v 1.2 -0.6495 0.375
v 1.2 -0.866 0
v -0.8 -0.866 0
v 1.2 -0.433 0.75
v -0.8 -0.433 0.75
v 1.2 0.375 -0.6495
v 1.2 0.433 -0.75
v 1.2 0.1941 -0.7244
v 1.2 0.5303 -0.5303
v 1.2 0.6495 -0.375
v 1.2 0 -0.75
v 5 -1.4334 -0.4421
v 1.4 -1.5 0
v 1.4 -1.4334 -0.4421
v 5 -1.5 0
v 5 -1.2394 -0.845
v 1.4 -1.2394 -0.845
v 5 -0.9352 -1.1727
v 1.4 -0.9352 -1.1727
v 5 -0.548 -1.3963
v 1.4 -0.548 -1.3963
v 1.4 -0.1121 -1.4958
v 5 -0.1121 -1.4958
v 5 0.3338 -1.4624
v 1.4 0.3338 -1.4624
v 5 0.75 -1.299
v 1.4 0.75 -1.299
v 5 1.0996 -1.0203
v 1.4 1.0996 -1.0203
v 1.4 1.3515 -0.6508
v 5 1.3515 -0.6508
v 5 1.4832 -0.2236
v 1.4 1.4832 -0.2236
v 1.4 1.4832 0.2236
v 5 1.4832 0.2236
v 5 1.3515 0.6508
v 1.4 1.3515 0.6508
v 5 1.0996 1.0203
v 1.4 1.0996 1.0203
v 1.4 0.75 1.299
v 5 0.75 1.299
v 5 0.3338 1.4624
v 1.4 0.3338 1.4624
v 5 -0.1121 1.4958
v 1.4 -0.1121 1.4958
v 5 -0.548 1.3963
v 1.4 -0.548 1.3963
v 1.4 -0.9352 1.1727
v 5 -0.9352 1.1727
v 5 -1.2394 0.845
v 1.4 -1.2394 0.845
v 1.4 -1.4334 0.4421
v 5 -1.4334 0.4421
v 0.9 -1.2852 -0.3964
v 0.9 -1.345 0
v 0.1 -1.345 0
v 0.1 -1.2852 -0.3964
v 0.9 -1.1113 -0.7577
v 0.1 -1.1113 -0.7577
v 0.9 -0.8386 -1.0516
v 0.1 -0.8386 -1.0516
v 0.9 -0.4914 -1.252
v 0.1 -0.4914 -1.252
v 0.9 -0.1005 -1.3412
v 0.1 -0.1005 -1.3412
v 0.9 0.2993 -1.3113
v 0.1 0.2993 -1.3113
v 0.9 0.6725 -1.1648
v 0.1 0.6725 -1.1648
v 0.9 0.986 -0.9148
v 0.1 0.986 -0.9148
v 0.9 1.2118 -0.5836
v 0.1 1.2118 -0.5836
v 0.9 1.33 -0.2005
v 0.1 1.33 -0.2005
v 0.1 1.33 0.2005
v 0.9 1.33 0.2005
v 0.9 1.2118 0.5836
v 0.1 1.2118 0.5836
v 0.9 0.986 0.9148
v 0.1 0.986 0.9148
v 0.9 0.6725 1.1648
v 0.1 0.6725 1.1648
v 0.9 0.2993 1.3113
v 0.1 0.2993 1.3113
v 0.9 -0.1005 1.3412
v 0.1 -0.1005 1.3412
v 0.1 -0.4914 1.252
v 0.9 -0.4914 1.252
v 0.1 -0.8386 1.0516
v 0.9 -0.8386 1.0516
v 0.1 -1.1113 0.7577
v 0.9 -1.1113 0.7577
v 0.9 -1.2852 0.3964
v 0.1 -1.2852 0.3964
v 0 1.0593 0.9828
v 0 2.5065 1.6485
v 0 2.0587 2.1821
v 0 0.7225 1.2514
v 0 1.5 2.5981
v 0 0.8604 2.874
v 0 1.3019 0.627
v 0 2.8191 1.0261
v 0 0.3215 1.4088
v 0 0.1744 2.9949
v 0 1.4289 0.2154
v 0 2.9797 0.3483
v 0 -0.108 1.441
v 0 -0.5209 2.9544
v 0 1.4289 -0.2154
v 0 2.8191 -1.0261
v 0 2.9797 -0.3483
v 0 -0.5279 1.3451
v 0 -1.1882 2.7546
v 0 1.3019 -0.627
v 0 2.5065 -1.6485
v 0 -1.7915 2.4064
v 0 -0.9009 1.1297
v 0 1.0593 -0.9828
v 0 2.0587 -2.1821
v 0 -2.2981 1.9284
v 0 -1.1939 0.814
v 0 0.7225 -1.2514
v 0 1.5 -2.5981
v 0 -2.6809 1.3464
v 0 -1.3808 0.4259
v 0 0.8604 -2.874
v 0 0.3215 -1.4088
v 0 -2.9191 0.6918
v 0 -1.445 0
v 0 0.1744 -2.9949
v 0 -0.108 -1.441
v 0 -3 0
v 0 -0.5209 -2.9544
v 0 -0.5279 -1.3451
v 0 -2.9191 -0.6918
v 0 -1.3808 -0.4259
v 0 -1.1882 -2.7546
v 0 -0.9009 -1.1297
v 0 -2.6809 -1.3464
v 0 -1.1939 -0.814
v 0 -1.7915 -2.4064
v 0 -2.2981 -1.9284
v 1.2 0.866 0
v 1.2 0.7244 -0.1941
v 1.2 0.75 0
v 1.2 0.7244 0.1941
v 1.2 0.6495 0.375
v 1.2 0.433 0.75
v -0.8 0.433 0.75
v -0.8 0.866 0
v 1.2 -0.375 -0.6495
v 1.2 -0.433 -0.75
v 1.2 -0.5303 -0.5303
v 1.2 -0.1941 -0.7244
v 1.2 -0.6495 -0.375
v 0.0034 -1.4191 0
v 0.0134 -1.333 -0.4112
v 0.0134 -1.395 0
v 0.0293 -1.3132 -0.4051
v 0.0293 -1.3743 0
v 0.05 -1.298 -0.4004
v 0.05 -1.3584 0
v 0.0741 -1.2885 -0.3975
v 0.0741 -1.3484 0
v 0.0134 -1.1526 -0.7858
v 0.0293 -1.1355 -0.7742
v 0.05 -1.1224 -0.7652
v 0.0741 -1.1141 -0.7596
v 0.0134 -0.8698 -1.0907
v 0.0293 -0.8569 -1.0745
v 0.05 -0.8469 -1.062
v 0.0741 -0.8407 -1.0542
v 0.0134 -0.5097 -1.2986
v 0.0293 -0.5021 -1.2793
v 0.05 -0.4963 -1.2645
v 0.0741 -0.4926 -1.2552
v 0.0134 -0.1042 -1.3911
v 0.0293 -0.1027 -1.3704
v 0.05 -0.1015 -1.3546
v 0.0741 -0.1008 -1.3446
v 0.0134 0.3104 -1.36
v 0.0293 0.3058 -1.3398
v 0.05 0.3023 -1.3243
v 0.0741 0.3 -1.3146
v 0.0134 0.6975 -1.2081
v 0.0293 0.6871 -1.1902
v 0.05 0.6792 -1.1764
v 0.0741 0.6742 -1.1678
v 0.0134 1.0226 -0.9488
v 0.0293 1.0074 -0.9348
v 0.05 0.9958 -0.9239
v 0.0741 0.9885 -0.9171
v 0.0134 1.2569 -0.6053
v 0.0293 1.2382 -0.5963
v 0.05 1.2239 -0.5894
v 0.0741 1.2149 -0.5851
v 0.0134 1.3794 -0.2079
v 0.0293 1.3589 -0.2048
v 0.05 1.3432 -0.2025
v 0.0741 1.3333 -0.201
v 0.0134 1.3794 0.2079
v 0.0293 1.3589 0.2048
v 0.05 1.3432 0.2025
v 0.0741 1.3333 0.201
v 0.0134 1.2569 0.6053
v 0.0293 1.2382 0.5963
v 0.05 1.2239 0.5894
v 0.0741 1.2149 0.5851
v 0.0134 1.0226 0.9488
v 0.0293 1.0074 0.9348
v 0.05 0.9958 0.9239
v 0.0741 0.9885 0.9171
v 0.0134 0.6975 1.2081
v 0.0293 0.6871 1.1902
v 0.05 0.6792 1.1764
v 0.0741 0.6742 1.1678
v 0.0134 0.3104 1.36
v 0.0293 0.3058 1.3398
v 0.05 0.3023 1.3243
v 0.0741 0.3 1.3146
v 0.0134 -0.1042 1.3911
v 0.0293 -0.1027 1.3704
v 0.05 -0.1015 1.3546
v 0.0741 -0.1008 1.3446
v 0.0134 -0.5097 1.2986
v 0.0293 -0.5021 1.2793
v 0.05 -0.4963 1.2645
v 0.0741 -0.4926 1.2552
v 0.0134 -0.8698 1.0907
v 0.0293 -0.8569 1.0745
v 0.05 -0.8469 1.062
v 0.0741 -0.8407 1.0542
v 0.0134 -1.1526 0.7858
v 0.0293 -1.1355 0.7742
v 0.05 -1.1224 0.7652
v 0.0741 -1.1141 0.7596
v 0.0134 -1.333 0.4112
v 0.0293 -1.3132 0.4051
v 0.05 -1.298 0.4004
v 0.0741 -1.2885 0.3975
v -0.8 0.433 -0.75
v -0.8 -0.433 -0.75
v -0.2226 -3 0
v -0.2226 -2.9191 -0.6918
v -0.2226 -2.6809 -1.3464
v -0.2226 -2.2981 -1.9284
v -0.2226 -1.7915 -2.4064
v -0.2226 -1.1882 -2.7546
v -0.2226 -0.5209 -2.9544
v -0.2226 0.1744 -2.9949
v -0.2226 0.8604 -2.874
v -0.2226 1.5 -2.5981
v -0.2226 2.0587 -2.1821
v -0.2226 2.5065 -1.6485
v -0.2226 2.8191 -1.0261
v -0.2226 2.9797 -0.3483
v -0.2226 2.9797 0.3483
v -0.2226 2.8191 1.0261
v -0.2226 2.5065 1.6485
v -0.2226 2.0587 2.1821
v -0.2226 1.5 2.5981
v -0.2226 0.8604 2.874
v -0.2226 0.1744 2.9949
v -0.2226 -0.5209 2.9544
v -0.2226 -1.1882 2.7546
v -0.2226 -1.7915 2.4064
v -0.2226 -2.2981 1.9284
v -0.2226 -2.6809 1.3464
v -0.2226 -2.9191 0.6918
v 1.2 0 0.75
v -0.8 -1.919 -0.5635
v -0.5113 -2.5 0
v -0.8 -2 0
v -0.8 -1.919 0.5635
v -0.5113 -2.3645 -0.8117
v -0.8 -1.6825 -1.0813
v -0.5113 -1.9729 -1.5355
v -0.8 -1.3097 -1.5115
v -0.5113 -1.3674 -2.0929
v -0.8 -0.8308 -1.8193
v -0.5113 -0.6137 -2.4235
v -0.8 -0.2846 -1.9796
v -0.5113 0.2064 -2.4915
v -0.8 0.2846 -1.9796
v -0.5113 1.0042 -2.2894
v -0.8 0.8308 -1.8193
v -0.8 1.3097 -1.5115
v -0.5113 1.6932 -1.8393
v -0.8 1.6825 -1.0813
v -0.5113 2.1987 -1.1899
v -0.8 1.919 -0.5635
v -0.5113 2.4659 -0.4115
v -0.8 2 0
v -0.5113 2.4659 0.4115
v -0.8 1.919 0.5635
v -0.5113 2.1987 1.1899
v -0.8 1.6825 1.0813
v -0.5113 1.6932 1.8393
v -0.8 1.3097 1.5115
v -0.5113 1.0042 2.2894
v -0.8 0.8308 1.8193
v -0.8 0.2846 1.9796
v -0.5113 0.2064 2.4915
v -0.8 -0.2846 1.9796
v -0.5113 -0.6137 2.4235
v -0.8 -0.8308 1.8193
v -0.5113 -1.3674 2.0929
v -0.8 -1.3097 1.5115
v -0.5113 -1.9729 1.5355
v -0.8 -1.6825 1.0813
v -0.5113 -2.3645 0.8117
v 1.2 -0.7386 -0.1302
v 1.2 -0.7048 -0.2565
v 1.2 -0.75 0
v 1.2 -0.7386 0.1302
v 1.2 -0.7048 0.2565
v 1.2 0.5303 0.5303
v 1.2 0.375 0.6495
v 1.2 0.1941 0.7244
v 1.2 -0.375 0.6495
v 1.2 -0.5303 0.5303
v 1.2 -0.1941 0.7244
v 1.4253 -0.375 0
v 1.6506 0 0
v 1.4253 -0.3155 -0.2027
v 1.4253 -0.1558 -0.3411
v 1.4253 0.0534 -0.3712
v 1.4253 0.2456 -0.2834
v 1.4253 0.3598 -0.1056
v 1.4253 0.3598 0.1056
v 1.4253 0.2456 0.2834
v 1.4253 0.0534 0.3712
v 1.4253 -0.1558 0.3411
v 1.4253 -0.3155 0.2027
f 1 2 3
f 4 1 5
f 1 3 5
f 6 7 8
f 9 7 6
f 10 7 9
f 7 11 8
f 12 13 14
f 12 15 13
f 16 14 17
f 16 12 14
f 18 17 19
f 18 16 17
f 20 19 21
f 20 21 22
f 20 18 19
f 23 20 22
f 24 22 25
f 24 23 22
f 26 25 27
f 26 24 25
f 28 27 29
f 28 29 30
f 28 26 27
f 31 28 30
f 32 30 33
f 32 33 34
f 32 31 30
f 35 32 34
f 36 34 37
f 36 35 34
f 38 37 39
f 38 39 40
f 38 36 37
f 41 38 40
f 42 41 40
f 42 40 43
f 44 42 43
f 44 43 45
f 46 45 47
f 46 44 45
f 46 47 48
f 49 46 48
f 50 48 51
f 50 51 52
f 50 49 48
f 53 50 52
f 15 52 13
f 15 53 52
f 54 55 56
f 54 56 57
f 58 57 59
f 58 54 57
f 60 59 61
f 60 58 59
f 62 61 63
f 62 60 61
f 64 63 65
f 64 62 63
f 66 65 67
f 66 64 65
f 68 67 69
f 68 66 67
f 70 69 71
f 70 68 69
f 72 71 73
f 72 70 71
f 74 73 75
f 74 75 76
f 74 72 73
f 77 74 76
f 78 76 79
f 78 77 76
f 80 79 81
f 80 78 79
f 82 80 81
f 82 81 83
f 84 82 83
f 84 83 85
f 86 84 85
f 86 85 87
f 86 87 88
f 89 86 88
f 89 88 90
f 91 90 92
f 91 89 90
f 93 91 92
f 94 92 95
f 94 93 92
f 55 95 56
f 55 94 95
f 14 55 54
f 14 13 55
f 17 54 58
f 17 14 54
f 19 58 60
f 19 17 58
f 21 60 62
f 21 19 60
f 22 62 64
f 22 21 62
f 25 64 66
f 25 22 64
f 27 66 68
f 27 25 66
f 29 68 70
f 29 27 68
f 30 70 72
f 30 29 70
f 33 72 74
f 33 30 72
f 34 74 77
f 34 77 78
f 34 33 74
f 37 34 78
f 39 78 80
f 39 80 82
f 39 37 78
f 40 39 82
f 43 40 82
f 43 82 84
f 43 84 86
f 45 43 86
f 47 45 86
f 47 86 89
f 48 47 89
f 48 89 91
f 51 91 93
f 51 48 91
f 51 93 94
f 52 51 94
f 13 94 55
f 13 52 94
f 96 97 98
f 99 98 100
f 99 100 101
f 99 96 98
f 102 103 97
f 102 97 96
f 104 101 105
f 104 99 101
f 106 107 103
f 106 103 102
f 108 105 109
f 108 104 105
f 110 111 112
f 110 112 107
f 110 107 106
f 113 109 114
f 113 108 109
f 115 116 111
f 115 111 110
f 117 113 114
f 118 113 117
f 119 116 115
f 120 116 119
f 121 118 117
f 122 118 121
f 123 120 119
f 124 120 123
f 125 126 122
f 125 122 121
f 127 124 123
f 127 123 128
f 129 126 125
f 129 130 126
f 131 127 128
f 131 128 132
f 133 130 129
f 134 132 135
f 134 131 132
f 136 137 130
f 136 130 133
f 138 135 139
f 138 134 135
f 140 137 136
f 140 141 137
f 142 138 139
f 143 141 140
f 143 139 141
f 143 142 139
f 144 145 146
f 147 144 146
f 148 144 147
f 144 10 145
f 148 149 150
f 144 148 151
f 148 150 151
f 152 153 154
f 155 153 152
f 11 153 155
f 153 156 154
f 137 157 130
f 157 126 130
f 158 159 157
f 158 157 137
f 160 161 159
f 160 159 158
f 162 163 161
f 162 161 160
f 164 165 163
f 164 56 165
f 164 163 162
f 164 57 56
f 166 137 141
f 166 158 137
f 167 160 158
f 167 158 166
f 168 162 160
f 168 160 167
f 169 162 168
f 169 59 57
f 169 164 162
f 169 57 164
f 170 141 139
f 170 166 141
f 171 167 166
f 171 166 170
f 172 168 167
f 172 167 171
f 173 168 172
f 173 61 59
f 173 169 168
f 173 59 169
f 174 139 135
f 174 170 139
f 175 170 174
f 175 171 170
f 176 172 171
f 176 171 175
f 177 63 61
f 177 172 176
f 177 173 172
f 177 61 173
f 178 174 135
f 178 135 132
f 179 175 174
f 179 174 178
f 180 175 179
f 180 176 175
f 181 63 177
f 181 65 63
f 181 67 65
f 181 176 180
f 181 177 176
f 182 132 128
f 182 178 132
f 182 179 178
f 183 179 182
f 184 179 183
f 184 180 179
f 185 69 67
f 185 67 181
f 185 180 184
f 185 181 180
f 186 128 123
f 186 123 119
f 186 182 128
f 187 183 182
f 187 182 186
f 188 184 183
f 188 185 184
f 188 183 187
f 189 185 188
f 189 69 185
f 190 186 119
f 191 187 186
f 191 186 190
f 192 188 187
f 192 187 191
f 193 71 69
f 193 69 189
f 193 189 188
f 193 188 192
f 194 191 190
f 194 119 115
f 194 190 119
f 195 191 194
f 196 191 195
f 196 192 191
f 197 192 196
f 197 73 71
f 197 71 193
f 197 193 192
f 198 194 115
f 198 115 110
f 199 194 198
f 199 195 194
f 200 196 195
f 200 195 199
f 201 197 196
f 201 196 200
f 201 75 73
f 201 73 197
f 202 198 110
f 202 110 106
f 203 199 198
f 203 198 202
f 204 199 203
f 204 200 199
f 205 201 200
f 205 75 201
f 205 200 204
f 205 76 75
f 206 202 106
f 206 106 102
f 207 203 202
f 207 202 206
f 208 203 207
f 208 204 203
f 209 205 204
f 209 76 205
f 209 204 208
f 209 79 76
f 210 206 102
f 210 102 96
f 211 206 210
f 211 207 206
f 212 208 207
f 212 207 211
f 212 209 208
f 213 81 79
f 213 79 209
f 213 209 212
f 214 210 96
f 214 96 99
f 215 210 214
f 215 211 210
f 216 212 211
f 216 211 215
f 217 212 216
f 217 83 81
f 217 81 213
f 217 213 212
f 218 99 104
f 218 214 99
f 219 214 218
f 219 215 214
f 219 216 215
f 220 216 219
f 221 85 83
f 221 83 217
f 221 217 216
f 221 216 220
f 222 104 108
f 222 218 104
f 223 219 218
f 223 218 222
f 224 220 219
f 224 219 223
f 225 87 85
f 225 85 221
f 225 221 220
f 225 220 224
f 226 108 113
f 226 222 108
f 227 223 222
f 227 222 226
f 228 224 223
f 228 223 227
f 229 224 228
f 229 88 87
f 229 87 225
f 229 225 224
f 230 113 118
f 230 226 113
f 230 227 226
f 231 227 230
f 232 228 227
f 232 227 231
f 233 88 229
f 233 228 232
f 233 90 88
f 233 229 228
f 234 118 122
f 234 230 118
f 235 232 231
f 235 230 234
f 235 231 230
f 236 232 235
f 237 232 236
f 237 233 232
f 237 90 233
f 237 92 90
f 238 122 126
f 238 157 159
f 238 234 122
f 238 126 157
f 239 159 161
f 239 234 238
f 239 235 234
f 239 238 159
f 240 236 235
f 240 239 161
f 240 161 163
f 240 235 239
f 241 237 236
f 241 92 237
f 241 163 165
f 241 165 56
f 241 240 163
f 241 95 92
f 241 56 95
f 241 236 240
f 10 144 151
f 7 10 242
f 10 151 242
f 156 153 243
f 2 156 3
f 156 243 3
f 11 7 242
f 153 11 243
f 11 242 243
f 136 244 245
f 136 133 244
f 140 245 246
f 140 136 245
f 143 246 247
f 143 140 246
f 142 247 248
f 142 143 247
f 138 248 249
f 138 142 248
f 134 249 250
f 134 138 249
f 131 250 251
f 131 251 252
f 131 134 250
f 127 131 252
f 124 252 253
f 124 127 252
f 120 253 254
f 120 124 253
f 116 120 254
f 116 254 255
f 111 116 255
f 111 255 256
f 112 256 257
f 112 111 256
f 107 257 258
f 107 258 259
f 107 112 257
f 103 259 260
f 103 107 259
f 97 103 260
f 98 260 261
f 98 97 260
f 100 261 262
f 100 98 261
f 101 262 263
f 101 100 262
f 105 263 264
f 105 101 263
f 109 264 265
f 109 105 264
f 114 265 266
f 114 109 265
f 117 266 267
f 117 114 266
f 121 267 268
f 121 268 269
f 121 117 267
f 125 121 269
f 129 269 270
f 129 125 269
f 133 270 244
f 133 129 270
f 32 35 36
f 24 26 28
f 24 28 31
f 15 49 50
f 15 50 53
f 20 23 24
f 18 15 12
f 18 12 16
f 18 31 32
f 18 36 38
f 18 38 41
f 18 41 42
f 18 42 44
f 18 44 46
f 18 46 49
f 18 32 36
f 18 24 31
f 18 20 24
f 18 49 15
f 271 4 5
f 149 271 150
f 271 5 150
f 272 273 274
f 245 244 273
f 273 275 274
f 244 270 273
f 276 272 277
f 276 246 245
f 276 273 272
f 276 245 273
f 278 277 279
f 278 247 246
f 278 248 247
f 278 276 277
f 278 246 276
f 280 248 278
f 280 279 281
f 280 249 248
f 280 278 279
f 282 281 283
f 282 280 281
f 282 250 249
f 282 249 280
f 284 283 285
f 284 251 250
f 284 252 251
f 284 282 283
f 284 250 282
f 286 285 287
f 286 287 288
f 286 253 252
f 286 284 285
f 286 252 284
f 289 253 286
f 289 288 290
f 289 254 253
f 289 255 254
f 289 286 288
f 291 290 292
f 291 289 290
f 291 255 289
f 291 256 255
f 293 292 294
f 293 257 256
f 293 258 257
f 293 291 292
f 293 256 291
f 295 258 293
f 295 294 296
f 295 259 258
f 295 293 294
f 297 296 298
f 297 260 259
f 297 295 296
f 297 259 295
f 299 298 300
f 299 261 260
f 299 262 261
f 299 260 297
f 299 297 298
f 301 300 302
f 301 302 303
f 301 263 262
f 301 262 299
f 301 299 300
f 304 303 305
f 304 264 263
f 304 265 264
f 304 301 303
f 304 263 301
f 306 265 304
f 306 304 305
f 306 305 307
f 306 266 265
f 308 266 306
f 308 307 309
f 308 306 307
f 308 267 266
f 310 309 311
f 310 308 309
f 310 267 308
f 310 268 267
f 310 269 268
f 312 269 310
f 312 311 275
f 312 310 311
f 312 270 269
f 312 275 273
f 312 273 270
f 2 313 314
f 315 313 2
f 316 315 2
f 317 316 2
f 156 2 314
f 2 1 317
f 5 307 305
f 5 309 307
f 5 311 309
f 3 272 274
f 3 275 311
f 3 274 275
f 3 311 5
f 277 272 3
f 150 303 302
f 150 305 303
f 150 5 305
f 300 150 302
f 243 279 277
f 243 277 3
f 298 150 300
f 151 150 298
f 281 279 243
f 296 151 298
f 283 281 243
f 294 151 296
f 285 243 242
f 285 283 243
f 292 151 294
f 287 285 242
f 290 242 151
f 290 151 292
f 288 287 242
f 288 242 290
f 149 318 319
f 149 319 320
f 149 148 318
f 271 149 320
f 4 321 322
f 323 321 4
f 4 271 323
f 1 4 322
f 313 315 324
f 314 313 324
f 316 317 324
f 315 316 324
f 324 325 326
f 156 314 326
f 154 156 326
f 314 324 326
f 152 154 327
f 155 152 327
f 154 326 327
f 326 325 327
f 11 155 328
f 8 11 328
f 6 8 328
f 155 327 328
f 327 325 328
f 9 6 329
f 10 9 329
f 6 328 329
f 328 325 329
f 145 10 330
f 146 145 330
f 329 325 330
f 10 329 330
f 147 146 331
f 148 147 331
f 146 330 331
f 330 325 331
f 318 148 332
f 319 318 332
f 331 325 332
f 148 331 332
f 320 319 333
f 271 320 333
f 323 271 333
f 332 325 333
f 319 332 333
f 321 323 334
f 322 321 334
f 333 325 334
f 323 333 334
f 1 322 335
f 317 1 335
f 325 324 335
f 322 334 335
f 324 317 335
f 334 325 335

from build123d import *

# Parameters (mm, degrees)
FILLET1_R          = 0.1
CUT_EXTRUDE1_DEPTH = 2


with BuildPart() as part:
    # Sketch1 → Revolve1 (revolve)
    with BuildSketch(Plane.XY, mode=Mode.PRIVATE) as revolve1_sk:
        Polygon((-0.8, 0), (-0.8, 2), (-0.222649731, 3), (0, 3), (0, 1.345), (0.9, 1.345), (1.4, 1.5), (5, 1.5), (5, 0), align=None)
    revolve(revolve1_sk.sketch.rotate(Axis((-0.8, 0, 0), (1, 0, 0)), 180), axis=Axis((-0.8, 0, 0), (1, 0, 0)))

    # Fillet1
    fillet1_edges = [part.edges().sort_by_distance(p)[0] for p in [
        (0, 1.345, 0),
    ]]
    fillet(fillet1_edges, radius=FILLET1_R)

    # Sketch2 → Cut-Extrude1 (cut)
    with BuildSketch(Plane.ZY.offset(0.8)):
        Polygon((0, 0.866025404), (-0.75, 0.433012702), (-0.75, -0.433012702), (0, -0.866025404), (0.75, -0.433012702), (0.75, 0.433012702), align=None)
    extrude(amount=-CUT_EXTRUDE1_DEPTH, mode=Mode.SUBTRACT)

    # Sketch3 → Cut-Revolve1 (revolve, cut)
    with BuildSketch(Plane.XY, mode=Mode.PRIVATE) as cut_revolve1_sk:
        Polygon((1.2, 0), (1.2, 0.75), (1.650645464, 0), align=None)
    revolve(cut_revolve1_sk.sketch.rotate(Axis((1.2, 0, 0), (1, 0, 0)), 180), axis=Axis((1.2, 0, 0), (1, 0, 0)), mode=Mode.SUBTRACT)


solid = part.part
